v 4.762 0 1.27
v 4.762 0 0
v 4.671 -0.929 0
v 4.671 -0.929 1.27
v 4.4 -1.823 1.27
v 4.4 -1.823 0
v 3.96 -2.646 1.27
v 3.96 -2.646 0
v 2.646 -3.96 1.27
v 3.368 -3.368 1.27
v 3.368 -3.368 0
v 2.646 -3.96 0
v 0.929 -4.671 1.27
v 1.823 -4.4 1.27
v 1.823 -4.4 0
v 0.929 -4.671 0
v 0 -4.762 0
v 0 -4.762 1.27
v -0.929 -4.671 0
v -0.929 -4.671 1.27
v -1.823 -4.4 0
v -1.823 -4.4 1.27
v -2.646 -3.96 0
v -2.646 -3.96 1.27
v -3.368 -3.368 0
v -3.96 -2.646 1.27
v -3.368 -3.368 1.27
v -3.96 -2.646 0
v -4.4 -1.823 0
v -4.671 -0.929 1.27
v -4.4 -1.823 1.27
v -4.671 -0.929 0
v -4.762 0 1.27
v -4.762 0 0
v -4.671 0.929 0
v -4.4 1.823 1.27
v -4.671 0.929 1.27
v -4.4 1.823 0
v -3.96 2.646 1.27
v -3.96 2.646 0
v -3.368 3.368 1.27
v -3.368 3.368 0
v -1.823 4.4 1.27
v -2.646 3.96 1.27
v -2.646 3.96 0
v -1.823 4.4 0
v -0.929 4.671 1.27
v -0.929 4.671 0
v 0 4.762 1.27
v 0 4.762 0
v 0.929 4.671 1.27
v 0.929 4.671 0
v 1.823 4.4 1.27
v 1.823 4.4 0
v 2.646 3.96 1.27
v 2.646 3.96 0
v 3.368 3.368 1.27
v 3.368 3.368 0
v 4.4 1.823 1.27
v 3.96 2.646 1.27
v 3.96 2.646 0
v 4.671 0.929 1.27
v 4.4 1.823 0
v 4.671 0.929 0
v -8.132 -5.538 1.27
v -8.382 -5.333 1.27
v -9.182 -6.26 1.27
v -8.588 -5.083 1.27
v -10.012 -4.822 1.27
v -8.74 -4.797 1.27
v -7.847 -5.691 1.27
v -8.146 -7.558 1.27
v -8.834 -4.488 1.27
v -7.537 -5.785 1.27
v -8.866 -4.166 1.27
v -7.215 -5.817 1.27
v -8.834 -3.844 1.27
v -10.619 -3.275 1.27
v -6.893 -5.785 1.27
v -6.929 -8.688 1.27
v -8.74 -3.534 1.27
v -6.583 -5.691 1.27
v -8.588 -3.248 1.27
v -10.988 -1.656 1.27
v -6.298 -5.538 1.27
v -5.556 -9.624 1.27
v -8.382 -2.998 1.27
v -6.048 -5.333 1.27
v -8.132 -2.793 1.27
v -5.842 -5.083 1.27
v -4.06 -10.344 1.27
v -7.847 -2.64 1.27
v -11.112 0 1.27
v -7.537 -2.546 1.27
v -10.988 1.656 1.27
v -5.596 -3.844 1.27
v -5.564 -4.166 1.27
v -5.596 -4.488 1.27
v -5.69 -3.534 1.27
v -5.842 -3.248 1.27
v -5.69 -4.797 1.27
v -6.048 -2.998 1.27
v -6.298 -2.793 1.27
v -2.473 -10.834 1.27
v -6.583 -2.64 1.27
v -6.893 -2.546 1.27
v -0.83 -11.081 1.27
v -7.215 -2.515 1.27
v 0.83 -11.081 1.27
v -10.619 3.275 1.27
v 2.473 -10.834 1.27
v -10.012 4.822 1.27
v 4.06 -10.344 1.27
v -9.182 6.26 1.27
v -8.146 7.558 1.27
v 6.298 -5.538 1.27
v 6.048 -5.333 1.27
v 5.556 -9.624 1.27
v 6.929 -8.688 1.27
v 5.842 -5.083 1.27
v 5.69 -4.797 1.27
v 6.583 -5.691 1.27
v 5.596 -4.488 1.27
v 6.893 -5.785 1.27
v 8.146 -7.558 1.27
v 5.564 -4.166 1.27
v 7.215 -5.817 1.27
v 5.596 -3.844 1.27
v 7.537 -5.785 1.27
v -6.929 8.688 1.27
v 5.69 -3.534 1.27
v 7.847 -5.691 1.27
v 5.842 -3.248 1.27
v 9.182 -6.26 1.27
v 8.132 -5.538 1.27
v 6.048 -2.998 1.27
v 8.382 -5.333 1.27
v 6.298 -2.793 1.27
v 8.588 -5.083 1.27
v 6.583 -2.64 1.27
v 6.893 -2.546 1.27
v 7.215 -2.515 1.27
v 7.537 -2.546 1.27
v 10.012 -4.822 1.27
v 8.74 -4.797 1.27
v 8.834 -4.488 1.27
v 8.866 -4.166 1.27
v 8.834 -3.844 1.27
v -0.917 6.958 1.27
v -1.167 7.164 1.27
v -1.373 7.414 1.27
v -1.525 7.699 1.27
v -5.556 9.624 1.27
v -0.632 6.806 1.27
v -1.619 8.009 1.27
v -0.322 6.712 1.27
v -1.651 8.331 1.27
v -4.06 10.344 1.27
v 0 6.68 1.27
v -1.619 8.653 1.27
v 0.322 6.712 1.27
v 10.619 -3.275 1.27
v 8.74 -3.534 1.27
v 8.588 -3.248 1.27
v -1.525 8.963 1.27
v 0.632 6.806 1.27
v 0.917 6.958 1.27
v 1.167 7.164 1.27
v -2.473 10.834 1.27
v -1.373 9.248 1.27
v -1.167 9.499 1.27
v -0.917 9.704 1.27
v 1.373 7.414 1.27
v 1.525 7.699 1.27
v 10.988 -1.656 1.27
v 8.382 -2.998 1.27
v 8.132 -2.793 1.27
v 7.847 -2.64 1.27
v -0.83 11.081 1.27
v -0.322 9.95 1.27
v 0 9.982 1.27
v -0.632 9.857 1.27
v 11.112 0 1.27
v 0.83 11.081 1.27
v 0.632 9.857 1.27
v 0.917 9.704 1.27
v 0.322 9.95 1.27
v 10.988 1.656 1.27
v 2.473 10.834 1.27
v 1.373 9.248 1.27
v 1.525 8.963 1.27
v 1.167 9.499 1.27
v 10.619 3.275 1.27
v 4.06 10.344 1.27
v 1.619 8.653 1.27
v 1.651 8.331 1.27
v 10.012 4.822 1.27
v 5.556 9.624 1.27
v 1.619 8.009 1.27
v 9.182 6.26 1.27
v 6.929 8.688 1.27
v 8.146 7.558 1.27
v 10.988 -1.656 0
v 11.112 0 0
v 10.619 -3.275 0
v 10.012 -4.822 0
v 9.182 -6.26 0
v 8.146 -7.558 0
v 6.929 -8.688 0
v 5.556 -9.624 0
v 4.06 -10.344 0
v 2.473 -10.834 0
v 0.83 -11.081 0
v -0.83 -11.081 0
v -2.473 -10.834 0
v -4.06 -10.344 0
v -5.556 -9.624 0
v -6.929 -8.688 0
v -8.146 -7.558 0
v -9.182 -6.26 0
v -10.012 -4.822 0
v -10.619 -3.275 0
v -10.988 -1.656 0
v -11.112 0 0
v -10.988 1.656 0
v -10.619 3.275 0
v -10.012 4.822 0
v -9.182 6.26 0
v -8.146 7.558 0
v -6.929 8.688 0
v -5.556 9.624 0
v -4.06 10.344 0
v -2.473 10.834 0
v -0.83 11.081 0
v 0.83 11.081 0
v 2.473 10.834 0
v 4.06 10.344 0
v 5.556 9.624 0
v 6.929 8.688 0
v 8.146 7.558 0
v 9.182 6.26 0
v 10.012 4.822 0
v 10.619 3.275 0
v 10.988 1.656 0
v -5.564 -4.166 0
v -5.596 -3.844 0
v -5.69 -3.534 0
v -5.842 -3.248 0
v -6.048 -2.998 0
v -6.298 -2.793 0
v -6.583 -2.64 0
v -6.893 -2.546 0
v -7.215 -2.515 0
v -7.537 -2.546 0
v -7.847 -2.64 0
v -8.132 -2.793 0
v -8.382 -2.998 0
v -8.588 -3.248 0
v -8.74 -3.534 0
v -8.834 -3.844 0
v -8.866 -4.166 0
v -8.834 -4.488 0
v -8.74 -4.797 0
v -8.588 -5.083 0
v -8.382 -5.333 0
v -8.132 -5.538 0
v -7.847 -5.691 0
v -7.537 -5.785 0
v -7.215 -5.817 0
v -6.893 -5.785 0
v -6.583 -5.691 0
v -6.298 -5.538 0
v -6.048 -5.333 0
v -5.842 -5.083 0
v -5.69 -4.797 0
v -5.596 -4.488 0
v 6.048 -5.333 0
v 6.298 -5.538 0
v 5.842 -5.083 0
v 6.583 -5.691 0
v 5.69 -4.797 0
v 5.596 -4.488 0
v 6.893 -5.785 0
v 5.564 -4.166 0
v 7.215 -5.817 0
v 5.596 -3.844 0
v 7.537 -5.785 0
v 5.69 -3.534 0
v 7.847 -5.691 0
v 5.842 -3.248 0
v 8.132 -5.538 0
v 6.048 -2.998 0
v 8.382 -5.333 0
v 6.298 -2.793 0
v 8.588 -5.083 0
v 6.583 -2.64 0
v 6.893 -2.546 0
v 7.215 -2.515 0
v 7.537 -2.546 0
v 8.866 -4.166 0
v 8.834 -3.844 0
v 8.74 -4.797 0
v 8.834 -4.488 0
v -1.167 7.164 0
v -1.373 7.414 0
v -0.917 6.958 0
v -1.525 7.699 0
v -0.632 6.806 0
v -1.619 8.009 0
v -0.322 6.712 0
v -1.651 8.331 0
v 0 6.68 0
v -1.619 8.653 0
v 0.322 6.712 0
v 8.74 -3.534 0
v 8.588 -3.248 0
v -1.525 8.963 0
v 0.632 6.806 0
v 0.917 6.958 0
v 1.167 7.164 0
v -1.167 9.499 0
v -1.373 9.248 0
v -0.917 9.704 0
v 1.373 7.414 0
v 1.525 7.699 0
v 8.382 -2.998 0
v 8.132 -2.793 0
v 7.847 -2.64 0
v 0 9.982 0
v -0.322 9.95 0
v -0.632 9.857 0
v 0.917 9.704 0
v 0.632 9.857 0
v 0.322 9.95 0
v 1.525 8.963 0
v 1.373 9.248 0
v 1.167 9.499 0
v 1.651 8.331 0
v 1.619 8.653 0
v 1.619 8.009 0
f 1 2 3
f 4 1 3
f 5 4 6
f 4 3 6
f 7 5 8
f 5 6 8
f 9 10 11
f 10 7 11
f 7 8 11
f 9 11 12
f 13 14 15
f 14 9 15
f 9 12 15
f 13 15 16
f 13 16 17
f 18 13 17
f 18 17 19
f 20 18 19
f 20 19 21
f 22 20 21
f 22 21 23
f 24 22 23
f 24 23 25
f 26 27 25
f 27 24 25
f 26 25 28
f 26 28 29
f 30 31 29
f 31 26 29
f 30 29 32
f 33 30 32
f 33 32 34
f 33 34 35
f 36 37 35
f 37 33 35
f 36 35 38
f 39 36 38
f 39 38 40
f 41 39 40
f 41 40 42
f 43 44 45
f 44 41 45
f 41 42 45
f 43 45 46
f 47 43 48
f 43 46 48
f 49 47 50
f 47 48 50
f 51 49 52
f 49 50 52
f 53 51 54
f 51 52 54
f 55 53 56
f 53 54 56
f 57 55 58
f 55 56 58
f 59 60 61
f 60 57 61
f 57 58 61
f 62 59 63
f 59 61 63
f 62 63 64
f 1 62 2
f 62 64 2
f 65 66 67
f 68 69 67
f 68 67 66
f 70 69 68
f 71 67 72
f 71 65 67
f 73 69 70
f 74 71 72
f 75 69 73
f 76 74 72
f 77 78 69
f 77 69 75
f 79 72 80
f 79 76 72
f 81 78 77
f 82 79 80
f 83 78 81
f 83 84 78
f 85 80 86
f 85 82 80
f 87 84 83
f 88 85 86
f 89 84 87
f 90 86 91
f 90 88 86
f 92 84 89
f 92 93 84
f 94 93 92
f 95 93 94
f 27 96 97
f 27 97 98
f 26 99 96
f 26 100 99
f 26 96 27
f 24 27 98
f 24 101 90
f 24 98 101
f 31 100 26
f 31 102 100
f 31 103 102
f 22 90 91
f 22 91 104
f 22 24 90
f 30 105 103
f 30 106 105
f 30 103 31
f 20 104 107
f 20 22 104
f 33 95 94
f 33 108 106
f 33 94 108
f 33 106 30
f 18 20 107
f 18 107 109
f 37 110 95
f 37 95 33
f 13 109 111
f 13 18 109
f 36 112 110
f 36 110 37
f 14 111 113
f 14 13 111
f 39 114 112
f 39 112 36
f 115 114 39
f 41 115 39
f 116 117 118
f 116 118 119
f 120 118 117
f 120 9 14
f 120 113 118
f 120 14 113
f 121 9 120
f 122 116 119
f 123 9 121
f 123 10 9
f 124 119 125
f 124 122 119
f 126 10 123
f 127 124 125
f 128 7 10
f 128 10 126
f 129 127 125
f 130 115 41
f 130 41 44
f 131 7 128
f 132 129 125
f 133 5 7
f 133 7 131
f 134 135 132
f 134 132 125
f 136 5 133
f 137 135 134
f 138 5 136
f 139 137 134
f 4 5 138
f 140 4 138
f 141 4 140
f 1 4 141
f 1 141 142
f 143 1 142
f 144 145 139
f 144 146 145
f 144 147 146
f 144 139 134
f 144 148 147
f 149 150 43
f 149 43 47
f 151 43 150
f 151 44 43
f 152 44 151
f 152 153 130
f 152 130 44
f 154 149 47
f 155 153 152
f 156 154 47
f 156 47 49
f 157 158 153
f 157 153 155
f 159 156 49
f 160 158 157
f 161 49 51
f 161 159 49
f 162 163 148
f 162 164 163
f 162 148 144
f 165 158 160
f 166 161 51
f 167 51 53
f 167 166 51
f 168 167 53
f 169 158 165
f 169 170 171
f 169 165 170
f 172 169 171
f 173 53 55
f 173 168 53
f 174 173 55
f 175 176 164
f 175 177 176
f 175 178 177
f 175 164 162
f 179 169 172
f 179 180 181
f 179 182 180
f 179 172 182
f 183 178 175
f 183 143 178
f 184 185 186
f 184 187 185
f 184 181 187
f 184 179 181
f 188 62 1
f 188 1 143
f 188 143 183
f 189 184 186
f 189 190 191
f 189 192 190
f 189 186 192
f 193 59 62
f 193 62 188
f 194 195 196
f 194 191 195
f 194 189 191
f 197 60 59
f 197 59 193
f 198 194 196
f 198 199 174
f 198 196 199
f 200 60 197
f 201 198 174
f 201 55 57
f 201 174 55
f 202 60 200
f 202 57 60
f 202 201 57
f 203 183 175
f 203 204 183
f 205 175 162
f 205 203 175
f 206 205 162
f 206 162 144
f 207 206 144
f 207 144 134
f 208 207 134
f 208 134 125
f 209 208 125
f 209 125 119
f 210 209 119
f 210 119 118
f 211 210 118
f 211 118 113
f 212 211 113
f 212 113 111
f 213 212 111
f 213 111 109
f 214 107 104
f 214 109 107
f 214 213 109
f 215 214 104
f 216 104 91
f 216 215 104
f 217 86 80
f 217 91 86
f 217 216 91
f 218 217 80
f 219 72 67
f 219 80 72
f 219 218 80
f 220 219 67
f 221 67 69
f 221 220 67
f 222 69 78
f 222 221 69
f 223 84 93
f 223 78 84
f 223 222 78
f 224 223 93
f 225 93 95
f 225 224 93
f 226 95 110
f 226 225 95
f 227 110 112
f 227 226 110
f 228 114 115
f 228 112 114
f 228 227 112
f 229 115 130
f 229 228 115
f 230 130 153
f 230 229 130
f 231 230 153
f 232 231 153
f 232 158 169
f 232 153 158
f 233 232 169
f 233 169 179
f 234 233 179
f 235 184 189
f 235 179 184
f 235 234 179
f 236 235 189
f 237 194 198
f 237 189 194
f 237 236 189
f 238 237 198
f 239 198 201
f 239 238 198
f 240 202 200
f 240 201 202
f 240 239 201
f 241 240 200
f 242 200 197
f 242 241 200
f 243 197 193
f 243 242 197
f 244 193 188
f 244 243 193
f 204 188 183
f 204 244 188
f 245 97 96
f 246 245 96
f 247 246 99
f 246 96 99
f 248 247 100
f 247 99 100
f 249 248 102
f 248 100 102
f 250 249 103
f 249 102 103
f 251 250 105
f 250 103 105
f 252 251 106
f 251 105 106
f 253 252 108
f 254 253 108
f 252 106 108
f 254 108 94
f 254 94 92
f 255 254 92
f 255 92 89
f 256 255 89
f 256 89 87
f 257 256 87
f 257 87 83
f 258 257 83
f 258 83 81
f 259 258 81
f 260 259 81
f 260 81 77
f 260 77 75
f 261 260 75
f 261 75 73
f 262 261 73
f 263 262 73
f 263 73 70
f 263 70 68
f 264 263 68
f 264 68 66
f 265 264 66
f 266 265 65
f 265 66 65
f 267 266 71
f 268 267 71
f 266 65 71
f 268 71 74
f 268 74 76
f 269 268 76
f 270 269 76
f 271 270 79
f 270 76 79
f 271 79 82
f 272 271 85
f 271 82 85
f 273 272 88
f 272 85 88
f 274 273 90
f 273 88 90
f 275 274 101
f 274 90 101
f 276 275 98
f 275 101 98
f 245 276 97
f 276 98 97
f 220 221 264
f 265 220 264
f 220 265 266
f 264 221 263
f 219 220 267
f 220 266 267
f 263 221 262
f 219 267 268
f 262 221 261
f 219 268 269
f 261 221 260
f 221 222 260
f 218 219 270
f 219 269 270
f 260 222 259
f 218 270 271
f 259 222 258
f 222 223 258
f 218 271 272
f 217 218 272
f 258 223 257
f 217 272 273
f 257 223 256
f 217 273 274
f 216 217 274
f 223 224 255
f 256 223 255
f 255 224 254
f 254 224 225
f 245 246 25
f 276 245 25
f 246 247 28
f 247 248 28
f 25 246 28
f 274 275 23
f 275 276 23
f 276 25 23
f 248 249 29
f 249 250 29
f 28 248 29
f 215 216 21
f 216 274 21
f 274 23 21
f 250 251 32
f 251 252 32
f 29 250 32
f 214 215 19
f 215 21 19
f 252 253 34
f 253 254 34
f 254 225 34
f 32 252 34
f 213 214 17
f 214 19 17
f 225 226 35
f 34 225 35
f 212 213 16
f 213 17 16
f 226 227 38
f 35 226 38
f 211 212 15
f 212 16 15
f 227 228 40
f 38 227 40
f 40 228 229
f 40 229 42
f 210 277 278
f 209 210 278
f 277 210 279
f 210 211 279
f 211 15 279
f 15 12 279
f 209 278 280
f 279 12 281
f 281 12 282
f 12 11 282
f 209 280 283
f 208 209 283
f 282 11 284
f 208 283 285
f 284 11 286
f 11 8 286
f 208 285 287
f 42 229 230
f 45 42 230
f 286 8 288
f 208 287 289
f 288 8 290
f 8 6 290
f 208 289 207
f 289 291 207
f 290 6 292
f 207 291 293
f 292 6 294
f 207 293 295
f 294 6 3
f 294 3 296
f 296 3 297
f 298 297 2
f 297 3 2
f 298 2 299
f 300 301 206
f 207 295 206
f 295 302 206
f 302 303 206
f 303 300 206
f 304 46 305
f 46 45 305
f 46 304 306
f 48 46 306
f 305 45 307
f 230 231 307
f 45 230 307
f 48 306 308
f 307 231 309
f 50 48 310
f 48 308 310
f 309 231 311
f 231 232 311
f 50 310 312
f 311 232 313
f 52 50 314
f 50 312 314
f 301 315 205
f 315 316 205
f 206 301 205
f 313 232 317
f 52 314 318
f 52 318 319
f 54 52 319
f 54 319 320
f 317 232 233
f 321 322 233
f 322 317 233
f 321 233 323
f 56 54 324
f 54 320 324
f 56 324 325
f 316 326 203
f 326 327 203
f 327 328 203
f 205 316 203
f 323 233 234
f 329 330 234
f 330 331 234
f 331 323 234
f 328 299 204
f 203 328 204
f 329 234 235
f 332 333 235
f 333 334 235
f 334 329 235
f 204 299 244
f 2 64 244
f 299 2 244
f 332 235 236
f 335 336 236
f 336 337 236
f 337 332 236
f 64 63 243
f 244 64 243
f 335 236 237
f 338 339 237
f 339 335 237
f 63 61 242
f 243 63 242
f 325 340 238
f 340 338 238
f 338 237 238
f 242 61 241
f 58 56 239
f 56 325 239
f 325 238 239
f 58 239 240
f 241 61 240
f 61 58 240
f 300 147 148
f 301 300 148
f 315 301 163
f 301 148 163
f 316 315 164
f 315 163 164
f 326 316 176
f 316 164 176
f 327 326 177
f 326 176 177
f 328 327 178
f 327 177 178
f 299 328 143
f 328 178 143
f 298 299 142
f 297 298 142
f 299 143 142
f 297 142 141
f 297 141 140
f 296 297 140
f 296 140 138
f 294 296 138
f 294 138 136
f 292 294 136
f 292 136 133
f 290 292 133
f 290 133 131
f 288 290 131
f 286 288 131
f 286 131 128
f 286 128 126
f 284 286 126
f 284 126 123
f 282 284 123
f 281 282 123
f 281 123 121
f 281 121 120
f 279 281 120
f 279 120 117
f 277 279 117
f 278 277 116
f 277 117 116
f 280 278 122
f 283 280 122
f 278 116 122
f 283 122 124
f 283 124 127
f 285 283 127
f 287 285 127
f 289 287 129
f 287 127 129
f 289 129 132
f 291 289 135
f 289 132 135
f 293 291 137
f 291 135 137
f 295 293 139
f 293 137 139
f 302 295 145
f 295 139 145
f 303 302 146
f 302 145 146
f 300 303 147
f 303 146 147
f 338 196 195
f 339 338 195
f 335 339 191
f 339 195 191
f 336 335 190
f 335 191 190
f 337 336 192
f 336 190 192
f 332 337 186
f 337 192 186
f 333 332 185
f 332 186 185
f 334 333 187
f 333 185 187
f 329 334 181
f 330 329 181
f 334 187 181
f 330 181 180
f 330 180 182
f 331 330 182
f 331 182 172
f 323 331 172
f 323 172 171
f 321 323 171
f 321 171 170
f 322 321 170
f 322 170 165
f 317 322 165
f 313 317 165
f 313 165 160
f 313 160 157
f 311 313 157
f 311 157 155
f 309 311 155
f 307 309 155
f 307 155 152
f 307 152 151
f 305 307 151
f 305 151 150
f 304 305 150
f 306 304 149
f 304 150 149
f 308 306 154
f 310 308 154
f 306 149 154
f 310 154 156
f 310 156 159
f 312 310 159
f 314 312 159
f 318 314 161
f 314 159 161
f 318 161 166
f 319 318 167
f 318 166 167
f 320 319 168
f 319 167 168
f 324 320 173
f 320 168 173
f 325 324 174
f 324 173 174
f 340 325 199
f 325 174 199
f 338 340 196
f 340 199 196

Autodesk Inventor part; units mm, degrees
ref_plane "YZ Plane" through (0, 0, 0) normal (1, 0, 0) x (0, 1, 0)
ref_plane "XZ Plane" through (0, 0, 0) normal (0, 1, 0) x (-1, 0, 0)
ref_plane "XY Plane" through (0, 0, 0) normal (0, 0, 1) x (1, 0, 0)
sketch "Sketch1" plane through (0, 0, 0) normal (0, 0, 1) x (1, 0, 0)
  circle A0 centre (0, 0) radius 4.7625
  circle A1 centre (0, 0) radius 11.1125
  dimension "d0" = 9.525
  dimension "d1" = 22.225
extrude "Extrusion1" add sketch "Sketch1" along normal blind 1.27
sketch "Sketch2" plane through (0, 0, 1.27) normal (0, 0, 1) x (1, 0, 0)
  circle A0 centre (0, 8.3312) radius 1.651
  circle A1 centre (-7.215, -4.1656) radius 1.651
  circle A2 centre (7.215, -4.1656) radius 1.651
  point P0 (0, 0)
  dimension "d4" = 3.302
  dimension "d7" = 360
  dimension "d9" = 8.3312
extrude "Extrusion2" cut sketch "Sketch2" against normal blind 1.27
properties part number "CompressionWasherPlastic" material "ABS Plastic"
